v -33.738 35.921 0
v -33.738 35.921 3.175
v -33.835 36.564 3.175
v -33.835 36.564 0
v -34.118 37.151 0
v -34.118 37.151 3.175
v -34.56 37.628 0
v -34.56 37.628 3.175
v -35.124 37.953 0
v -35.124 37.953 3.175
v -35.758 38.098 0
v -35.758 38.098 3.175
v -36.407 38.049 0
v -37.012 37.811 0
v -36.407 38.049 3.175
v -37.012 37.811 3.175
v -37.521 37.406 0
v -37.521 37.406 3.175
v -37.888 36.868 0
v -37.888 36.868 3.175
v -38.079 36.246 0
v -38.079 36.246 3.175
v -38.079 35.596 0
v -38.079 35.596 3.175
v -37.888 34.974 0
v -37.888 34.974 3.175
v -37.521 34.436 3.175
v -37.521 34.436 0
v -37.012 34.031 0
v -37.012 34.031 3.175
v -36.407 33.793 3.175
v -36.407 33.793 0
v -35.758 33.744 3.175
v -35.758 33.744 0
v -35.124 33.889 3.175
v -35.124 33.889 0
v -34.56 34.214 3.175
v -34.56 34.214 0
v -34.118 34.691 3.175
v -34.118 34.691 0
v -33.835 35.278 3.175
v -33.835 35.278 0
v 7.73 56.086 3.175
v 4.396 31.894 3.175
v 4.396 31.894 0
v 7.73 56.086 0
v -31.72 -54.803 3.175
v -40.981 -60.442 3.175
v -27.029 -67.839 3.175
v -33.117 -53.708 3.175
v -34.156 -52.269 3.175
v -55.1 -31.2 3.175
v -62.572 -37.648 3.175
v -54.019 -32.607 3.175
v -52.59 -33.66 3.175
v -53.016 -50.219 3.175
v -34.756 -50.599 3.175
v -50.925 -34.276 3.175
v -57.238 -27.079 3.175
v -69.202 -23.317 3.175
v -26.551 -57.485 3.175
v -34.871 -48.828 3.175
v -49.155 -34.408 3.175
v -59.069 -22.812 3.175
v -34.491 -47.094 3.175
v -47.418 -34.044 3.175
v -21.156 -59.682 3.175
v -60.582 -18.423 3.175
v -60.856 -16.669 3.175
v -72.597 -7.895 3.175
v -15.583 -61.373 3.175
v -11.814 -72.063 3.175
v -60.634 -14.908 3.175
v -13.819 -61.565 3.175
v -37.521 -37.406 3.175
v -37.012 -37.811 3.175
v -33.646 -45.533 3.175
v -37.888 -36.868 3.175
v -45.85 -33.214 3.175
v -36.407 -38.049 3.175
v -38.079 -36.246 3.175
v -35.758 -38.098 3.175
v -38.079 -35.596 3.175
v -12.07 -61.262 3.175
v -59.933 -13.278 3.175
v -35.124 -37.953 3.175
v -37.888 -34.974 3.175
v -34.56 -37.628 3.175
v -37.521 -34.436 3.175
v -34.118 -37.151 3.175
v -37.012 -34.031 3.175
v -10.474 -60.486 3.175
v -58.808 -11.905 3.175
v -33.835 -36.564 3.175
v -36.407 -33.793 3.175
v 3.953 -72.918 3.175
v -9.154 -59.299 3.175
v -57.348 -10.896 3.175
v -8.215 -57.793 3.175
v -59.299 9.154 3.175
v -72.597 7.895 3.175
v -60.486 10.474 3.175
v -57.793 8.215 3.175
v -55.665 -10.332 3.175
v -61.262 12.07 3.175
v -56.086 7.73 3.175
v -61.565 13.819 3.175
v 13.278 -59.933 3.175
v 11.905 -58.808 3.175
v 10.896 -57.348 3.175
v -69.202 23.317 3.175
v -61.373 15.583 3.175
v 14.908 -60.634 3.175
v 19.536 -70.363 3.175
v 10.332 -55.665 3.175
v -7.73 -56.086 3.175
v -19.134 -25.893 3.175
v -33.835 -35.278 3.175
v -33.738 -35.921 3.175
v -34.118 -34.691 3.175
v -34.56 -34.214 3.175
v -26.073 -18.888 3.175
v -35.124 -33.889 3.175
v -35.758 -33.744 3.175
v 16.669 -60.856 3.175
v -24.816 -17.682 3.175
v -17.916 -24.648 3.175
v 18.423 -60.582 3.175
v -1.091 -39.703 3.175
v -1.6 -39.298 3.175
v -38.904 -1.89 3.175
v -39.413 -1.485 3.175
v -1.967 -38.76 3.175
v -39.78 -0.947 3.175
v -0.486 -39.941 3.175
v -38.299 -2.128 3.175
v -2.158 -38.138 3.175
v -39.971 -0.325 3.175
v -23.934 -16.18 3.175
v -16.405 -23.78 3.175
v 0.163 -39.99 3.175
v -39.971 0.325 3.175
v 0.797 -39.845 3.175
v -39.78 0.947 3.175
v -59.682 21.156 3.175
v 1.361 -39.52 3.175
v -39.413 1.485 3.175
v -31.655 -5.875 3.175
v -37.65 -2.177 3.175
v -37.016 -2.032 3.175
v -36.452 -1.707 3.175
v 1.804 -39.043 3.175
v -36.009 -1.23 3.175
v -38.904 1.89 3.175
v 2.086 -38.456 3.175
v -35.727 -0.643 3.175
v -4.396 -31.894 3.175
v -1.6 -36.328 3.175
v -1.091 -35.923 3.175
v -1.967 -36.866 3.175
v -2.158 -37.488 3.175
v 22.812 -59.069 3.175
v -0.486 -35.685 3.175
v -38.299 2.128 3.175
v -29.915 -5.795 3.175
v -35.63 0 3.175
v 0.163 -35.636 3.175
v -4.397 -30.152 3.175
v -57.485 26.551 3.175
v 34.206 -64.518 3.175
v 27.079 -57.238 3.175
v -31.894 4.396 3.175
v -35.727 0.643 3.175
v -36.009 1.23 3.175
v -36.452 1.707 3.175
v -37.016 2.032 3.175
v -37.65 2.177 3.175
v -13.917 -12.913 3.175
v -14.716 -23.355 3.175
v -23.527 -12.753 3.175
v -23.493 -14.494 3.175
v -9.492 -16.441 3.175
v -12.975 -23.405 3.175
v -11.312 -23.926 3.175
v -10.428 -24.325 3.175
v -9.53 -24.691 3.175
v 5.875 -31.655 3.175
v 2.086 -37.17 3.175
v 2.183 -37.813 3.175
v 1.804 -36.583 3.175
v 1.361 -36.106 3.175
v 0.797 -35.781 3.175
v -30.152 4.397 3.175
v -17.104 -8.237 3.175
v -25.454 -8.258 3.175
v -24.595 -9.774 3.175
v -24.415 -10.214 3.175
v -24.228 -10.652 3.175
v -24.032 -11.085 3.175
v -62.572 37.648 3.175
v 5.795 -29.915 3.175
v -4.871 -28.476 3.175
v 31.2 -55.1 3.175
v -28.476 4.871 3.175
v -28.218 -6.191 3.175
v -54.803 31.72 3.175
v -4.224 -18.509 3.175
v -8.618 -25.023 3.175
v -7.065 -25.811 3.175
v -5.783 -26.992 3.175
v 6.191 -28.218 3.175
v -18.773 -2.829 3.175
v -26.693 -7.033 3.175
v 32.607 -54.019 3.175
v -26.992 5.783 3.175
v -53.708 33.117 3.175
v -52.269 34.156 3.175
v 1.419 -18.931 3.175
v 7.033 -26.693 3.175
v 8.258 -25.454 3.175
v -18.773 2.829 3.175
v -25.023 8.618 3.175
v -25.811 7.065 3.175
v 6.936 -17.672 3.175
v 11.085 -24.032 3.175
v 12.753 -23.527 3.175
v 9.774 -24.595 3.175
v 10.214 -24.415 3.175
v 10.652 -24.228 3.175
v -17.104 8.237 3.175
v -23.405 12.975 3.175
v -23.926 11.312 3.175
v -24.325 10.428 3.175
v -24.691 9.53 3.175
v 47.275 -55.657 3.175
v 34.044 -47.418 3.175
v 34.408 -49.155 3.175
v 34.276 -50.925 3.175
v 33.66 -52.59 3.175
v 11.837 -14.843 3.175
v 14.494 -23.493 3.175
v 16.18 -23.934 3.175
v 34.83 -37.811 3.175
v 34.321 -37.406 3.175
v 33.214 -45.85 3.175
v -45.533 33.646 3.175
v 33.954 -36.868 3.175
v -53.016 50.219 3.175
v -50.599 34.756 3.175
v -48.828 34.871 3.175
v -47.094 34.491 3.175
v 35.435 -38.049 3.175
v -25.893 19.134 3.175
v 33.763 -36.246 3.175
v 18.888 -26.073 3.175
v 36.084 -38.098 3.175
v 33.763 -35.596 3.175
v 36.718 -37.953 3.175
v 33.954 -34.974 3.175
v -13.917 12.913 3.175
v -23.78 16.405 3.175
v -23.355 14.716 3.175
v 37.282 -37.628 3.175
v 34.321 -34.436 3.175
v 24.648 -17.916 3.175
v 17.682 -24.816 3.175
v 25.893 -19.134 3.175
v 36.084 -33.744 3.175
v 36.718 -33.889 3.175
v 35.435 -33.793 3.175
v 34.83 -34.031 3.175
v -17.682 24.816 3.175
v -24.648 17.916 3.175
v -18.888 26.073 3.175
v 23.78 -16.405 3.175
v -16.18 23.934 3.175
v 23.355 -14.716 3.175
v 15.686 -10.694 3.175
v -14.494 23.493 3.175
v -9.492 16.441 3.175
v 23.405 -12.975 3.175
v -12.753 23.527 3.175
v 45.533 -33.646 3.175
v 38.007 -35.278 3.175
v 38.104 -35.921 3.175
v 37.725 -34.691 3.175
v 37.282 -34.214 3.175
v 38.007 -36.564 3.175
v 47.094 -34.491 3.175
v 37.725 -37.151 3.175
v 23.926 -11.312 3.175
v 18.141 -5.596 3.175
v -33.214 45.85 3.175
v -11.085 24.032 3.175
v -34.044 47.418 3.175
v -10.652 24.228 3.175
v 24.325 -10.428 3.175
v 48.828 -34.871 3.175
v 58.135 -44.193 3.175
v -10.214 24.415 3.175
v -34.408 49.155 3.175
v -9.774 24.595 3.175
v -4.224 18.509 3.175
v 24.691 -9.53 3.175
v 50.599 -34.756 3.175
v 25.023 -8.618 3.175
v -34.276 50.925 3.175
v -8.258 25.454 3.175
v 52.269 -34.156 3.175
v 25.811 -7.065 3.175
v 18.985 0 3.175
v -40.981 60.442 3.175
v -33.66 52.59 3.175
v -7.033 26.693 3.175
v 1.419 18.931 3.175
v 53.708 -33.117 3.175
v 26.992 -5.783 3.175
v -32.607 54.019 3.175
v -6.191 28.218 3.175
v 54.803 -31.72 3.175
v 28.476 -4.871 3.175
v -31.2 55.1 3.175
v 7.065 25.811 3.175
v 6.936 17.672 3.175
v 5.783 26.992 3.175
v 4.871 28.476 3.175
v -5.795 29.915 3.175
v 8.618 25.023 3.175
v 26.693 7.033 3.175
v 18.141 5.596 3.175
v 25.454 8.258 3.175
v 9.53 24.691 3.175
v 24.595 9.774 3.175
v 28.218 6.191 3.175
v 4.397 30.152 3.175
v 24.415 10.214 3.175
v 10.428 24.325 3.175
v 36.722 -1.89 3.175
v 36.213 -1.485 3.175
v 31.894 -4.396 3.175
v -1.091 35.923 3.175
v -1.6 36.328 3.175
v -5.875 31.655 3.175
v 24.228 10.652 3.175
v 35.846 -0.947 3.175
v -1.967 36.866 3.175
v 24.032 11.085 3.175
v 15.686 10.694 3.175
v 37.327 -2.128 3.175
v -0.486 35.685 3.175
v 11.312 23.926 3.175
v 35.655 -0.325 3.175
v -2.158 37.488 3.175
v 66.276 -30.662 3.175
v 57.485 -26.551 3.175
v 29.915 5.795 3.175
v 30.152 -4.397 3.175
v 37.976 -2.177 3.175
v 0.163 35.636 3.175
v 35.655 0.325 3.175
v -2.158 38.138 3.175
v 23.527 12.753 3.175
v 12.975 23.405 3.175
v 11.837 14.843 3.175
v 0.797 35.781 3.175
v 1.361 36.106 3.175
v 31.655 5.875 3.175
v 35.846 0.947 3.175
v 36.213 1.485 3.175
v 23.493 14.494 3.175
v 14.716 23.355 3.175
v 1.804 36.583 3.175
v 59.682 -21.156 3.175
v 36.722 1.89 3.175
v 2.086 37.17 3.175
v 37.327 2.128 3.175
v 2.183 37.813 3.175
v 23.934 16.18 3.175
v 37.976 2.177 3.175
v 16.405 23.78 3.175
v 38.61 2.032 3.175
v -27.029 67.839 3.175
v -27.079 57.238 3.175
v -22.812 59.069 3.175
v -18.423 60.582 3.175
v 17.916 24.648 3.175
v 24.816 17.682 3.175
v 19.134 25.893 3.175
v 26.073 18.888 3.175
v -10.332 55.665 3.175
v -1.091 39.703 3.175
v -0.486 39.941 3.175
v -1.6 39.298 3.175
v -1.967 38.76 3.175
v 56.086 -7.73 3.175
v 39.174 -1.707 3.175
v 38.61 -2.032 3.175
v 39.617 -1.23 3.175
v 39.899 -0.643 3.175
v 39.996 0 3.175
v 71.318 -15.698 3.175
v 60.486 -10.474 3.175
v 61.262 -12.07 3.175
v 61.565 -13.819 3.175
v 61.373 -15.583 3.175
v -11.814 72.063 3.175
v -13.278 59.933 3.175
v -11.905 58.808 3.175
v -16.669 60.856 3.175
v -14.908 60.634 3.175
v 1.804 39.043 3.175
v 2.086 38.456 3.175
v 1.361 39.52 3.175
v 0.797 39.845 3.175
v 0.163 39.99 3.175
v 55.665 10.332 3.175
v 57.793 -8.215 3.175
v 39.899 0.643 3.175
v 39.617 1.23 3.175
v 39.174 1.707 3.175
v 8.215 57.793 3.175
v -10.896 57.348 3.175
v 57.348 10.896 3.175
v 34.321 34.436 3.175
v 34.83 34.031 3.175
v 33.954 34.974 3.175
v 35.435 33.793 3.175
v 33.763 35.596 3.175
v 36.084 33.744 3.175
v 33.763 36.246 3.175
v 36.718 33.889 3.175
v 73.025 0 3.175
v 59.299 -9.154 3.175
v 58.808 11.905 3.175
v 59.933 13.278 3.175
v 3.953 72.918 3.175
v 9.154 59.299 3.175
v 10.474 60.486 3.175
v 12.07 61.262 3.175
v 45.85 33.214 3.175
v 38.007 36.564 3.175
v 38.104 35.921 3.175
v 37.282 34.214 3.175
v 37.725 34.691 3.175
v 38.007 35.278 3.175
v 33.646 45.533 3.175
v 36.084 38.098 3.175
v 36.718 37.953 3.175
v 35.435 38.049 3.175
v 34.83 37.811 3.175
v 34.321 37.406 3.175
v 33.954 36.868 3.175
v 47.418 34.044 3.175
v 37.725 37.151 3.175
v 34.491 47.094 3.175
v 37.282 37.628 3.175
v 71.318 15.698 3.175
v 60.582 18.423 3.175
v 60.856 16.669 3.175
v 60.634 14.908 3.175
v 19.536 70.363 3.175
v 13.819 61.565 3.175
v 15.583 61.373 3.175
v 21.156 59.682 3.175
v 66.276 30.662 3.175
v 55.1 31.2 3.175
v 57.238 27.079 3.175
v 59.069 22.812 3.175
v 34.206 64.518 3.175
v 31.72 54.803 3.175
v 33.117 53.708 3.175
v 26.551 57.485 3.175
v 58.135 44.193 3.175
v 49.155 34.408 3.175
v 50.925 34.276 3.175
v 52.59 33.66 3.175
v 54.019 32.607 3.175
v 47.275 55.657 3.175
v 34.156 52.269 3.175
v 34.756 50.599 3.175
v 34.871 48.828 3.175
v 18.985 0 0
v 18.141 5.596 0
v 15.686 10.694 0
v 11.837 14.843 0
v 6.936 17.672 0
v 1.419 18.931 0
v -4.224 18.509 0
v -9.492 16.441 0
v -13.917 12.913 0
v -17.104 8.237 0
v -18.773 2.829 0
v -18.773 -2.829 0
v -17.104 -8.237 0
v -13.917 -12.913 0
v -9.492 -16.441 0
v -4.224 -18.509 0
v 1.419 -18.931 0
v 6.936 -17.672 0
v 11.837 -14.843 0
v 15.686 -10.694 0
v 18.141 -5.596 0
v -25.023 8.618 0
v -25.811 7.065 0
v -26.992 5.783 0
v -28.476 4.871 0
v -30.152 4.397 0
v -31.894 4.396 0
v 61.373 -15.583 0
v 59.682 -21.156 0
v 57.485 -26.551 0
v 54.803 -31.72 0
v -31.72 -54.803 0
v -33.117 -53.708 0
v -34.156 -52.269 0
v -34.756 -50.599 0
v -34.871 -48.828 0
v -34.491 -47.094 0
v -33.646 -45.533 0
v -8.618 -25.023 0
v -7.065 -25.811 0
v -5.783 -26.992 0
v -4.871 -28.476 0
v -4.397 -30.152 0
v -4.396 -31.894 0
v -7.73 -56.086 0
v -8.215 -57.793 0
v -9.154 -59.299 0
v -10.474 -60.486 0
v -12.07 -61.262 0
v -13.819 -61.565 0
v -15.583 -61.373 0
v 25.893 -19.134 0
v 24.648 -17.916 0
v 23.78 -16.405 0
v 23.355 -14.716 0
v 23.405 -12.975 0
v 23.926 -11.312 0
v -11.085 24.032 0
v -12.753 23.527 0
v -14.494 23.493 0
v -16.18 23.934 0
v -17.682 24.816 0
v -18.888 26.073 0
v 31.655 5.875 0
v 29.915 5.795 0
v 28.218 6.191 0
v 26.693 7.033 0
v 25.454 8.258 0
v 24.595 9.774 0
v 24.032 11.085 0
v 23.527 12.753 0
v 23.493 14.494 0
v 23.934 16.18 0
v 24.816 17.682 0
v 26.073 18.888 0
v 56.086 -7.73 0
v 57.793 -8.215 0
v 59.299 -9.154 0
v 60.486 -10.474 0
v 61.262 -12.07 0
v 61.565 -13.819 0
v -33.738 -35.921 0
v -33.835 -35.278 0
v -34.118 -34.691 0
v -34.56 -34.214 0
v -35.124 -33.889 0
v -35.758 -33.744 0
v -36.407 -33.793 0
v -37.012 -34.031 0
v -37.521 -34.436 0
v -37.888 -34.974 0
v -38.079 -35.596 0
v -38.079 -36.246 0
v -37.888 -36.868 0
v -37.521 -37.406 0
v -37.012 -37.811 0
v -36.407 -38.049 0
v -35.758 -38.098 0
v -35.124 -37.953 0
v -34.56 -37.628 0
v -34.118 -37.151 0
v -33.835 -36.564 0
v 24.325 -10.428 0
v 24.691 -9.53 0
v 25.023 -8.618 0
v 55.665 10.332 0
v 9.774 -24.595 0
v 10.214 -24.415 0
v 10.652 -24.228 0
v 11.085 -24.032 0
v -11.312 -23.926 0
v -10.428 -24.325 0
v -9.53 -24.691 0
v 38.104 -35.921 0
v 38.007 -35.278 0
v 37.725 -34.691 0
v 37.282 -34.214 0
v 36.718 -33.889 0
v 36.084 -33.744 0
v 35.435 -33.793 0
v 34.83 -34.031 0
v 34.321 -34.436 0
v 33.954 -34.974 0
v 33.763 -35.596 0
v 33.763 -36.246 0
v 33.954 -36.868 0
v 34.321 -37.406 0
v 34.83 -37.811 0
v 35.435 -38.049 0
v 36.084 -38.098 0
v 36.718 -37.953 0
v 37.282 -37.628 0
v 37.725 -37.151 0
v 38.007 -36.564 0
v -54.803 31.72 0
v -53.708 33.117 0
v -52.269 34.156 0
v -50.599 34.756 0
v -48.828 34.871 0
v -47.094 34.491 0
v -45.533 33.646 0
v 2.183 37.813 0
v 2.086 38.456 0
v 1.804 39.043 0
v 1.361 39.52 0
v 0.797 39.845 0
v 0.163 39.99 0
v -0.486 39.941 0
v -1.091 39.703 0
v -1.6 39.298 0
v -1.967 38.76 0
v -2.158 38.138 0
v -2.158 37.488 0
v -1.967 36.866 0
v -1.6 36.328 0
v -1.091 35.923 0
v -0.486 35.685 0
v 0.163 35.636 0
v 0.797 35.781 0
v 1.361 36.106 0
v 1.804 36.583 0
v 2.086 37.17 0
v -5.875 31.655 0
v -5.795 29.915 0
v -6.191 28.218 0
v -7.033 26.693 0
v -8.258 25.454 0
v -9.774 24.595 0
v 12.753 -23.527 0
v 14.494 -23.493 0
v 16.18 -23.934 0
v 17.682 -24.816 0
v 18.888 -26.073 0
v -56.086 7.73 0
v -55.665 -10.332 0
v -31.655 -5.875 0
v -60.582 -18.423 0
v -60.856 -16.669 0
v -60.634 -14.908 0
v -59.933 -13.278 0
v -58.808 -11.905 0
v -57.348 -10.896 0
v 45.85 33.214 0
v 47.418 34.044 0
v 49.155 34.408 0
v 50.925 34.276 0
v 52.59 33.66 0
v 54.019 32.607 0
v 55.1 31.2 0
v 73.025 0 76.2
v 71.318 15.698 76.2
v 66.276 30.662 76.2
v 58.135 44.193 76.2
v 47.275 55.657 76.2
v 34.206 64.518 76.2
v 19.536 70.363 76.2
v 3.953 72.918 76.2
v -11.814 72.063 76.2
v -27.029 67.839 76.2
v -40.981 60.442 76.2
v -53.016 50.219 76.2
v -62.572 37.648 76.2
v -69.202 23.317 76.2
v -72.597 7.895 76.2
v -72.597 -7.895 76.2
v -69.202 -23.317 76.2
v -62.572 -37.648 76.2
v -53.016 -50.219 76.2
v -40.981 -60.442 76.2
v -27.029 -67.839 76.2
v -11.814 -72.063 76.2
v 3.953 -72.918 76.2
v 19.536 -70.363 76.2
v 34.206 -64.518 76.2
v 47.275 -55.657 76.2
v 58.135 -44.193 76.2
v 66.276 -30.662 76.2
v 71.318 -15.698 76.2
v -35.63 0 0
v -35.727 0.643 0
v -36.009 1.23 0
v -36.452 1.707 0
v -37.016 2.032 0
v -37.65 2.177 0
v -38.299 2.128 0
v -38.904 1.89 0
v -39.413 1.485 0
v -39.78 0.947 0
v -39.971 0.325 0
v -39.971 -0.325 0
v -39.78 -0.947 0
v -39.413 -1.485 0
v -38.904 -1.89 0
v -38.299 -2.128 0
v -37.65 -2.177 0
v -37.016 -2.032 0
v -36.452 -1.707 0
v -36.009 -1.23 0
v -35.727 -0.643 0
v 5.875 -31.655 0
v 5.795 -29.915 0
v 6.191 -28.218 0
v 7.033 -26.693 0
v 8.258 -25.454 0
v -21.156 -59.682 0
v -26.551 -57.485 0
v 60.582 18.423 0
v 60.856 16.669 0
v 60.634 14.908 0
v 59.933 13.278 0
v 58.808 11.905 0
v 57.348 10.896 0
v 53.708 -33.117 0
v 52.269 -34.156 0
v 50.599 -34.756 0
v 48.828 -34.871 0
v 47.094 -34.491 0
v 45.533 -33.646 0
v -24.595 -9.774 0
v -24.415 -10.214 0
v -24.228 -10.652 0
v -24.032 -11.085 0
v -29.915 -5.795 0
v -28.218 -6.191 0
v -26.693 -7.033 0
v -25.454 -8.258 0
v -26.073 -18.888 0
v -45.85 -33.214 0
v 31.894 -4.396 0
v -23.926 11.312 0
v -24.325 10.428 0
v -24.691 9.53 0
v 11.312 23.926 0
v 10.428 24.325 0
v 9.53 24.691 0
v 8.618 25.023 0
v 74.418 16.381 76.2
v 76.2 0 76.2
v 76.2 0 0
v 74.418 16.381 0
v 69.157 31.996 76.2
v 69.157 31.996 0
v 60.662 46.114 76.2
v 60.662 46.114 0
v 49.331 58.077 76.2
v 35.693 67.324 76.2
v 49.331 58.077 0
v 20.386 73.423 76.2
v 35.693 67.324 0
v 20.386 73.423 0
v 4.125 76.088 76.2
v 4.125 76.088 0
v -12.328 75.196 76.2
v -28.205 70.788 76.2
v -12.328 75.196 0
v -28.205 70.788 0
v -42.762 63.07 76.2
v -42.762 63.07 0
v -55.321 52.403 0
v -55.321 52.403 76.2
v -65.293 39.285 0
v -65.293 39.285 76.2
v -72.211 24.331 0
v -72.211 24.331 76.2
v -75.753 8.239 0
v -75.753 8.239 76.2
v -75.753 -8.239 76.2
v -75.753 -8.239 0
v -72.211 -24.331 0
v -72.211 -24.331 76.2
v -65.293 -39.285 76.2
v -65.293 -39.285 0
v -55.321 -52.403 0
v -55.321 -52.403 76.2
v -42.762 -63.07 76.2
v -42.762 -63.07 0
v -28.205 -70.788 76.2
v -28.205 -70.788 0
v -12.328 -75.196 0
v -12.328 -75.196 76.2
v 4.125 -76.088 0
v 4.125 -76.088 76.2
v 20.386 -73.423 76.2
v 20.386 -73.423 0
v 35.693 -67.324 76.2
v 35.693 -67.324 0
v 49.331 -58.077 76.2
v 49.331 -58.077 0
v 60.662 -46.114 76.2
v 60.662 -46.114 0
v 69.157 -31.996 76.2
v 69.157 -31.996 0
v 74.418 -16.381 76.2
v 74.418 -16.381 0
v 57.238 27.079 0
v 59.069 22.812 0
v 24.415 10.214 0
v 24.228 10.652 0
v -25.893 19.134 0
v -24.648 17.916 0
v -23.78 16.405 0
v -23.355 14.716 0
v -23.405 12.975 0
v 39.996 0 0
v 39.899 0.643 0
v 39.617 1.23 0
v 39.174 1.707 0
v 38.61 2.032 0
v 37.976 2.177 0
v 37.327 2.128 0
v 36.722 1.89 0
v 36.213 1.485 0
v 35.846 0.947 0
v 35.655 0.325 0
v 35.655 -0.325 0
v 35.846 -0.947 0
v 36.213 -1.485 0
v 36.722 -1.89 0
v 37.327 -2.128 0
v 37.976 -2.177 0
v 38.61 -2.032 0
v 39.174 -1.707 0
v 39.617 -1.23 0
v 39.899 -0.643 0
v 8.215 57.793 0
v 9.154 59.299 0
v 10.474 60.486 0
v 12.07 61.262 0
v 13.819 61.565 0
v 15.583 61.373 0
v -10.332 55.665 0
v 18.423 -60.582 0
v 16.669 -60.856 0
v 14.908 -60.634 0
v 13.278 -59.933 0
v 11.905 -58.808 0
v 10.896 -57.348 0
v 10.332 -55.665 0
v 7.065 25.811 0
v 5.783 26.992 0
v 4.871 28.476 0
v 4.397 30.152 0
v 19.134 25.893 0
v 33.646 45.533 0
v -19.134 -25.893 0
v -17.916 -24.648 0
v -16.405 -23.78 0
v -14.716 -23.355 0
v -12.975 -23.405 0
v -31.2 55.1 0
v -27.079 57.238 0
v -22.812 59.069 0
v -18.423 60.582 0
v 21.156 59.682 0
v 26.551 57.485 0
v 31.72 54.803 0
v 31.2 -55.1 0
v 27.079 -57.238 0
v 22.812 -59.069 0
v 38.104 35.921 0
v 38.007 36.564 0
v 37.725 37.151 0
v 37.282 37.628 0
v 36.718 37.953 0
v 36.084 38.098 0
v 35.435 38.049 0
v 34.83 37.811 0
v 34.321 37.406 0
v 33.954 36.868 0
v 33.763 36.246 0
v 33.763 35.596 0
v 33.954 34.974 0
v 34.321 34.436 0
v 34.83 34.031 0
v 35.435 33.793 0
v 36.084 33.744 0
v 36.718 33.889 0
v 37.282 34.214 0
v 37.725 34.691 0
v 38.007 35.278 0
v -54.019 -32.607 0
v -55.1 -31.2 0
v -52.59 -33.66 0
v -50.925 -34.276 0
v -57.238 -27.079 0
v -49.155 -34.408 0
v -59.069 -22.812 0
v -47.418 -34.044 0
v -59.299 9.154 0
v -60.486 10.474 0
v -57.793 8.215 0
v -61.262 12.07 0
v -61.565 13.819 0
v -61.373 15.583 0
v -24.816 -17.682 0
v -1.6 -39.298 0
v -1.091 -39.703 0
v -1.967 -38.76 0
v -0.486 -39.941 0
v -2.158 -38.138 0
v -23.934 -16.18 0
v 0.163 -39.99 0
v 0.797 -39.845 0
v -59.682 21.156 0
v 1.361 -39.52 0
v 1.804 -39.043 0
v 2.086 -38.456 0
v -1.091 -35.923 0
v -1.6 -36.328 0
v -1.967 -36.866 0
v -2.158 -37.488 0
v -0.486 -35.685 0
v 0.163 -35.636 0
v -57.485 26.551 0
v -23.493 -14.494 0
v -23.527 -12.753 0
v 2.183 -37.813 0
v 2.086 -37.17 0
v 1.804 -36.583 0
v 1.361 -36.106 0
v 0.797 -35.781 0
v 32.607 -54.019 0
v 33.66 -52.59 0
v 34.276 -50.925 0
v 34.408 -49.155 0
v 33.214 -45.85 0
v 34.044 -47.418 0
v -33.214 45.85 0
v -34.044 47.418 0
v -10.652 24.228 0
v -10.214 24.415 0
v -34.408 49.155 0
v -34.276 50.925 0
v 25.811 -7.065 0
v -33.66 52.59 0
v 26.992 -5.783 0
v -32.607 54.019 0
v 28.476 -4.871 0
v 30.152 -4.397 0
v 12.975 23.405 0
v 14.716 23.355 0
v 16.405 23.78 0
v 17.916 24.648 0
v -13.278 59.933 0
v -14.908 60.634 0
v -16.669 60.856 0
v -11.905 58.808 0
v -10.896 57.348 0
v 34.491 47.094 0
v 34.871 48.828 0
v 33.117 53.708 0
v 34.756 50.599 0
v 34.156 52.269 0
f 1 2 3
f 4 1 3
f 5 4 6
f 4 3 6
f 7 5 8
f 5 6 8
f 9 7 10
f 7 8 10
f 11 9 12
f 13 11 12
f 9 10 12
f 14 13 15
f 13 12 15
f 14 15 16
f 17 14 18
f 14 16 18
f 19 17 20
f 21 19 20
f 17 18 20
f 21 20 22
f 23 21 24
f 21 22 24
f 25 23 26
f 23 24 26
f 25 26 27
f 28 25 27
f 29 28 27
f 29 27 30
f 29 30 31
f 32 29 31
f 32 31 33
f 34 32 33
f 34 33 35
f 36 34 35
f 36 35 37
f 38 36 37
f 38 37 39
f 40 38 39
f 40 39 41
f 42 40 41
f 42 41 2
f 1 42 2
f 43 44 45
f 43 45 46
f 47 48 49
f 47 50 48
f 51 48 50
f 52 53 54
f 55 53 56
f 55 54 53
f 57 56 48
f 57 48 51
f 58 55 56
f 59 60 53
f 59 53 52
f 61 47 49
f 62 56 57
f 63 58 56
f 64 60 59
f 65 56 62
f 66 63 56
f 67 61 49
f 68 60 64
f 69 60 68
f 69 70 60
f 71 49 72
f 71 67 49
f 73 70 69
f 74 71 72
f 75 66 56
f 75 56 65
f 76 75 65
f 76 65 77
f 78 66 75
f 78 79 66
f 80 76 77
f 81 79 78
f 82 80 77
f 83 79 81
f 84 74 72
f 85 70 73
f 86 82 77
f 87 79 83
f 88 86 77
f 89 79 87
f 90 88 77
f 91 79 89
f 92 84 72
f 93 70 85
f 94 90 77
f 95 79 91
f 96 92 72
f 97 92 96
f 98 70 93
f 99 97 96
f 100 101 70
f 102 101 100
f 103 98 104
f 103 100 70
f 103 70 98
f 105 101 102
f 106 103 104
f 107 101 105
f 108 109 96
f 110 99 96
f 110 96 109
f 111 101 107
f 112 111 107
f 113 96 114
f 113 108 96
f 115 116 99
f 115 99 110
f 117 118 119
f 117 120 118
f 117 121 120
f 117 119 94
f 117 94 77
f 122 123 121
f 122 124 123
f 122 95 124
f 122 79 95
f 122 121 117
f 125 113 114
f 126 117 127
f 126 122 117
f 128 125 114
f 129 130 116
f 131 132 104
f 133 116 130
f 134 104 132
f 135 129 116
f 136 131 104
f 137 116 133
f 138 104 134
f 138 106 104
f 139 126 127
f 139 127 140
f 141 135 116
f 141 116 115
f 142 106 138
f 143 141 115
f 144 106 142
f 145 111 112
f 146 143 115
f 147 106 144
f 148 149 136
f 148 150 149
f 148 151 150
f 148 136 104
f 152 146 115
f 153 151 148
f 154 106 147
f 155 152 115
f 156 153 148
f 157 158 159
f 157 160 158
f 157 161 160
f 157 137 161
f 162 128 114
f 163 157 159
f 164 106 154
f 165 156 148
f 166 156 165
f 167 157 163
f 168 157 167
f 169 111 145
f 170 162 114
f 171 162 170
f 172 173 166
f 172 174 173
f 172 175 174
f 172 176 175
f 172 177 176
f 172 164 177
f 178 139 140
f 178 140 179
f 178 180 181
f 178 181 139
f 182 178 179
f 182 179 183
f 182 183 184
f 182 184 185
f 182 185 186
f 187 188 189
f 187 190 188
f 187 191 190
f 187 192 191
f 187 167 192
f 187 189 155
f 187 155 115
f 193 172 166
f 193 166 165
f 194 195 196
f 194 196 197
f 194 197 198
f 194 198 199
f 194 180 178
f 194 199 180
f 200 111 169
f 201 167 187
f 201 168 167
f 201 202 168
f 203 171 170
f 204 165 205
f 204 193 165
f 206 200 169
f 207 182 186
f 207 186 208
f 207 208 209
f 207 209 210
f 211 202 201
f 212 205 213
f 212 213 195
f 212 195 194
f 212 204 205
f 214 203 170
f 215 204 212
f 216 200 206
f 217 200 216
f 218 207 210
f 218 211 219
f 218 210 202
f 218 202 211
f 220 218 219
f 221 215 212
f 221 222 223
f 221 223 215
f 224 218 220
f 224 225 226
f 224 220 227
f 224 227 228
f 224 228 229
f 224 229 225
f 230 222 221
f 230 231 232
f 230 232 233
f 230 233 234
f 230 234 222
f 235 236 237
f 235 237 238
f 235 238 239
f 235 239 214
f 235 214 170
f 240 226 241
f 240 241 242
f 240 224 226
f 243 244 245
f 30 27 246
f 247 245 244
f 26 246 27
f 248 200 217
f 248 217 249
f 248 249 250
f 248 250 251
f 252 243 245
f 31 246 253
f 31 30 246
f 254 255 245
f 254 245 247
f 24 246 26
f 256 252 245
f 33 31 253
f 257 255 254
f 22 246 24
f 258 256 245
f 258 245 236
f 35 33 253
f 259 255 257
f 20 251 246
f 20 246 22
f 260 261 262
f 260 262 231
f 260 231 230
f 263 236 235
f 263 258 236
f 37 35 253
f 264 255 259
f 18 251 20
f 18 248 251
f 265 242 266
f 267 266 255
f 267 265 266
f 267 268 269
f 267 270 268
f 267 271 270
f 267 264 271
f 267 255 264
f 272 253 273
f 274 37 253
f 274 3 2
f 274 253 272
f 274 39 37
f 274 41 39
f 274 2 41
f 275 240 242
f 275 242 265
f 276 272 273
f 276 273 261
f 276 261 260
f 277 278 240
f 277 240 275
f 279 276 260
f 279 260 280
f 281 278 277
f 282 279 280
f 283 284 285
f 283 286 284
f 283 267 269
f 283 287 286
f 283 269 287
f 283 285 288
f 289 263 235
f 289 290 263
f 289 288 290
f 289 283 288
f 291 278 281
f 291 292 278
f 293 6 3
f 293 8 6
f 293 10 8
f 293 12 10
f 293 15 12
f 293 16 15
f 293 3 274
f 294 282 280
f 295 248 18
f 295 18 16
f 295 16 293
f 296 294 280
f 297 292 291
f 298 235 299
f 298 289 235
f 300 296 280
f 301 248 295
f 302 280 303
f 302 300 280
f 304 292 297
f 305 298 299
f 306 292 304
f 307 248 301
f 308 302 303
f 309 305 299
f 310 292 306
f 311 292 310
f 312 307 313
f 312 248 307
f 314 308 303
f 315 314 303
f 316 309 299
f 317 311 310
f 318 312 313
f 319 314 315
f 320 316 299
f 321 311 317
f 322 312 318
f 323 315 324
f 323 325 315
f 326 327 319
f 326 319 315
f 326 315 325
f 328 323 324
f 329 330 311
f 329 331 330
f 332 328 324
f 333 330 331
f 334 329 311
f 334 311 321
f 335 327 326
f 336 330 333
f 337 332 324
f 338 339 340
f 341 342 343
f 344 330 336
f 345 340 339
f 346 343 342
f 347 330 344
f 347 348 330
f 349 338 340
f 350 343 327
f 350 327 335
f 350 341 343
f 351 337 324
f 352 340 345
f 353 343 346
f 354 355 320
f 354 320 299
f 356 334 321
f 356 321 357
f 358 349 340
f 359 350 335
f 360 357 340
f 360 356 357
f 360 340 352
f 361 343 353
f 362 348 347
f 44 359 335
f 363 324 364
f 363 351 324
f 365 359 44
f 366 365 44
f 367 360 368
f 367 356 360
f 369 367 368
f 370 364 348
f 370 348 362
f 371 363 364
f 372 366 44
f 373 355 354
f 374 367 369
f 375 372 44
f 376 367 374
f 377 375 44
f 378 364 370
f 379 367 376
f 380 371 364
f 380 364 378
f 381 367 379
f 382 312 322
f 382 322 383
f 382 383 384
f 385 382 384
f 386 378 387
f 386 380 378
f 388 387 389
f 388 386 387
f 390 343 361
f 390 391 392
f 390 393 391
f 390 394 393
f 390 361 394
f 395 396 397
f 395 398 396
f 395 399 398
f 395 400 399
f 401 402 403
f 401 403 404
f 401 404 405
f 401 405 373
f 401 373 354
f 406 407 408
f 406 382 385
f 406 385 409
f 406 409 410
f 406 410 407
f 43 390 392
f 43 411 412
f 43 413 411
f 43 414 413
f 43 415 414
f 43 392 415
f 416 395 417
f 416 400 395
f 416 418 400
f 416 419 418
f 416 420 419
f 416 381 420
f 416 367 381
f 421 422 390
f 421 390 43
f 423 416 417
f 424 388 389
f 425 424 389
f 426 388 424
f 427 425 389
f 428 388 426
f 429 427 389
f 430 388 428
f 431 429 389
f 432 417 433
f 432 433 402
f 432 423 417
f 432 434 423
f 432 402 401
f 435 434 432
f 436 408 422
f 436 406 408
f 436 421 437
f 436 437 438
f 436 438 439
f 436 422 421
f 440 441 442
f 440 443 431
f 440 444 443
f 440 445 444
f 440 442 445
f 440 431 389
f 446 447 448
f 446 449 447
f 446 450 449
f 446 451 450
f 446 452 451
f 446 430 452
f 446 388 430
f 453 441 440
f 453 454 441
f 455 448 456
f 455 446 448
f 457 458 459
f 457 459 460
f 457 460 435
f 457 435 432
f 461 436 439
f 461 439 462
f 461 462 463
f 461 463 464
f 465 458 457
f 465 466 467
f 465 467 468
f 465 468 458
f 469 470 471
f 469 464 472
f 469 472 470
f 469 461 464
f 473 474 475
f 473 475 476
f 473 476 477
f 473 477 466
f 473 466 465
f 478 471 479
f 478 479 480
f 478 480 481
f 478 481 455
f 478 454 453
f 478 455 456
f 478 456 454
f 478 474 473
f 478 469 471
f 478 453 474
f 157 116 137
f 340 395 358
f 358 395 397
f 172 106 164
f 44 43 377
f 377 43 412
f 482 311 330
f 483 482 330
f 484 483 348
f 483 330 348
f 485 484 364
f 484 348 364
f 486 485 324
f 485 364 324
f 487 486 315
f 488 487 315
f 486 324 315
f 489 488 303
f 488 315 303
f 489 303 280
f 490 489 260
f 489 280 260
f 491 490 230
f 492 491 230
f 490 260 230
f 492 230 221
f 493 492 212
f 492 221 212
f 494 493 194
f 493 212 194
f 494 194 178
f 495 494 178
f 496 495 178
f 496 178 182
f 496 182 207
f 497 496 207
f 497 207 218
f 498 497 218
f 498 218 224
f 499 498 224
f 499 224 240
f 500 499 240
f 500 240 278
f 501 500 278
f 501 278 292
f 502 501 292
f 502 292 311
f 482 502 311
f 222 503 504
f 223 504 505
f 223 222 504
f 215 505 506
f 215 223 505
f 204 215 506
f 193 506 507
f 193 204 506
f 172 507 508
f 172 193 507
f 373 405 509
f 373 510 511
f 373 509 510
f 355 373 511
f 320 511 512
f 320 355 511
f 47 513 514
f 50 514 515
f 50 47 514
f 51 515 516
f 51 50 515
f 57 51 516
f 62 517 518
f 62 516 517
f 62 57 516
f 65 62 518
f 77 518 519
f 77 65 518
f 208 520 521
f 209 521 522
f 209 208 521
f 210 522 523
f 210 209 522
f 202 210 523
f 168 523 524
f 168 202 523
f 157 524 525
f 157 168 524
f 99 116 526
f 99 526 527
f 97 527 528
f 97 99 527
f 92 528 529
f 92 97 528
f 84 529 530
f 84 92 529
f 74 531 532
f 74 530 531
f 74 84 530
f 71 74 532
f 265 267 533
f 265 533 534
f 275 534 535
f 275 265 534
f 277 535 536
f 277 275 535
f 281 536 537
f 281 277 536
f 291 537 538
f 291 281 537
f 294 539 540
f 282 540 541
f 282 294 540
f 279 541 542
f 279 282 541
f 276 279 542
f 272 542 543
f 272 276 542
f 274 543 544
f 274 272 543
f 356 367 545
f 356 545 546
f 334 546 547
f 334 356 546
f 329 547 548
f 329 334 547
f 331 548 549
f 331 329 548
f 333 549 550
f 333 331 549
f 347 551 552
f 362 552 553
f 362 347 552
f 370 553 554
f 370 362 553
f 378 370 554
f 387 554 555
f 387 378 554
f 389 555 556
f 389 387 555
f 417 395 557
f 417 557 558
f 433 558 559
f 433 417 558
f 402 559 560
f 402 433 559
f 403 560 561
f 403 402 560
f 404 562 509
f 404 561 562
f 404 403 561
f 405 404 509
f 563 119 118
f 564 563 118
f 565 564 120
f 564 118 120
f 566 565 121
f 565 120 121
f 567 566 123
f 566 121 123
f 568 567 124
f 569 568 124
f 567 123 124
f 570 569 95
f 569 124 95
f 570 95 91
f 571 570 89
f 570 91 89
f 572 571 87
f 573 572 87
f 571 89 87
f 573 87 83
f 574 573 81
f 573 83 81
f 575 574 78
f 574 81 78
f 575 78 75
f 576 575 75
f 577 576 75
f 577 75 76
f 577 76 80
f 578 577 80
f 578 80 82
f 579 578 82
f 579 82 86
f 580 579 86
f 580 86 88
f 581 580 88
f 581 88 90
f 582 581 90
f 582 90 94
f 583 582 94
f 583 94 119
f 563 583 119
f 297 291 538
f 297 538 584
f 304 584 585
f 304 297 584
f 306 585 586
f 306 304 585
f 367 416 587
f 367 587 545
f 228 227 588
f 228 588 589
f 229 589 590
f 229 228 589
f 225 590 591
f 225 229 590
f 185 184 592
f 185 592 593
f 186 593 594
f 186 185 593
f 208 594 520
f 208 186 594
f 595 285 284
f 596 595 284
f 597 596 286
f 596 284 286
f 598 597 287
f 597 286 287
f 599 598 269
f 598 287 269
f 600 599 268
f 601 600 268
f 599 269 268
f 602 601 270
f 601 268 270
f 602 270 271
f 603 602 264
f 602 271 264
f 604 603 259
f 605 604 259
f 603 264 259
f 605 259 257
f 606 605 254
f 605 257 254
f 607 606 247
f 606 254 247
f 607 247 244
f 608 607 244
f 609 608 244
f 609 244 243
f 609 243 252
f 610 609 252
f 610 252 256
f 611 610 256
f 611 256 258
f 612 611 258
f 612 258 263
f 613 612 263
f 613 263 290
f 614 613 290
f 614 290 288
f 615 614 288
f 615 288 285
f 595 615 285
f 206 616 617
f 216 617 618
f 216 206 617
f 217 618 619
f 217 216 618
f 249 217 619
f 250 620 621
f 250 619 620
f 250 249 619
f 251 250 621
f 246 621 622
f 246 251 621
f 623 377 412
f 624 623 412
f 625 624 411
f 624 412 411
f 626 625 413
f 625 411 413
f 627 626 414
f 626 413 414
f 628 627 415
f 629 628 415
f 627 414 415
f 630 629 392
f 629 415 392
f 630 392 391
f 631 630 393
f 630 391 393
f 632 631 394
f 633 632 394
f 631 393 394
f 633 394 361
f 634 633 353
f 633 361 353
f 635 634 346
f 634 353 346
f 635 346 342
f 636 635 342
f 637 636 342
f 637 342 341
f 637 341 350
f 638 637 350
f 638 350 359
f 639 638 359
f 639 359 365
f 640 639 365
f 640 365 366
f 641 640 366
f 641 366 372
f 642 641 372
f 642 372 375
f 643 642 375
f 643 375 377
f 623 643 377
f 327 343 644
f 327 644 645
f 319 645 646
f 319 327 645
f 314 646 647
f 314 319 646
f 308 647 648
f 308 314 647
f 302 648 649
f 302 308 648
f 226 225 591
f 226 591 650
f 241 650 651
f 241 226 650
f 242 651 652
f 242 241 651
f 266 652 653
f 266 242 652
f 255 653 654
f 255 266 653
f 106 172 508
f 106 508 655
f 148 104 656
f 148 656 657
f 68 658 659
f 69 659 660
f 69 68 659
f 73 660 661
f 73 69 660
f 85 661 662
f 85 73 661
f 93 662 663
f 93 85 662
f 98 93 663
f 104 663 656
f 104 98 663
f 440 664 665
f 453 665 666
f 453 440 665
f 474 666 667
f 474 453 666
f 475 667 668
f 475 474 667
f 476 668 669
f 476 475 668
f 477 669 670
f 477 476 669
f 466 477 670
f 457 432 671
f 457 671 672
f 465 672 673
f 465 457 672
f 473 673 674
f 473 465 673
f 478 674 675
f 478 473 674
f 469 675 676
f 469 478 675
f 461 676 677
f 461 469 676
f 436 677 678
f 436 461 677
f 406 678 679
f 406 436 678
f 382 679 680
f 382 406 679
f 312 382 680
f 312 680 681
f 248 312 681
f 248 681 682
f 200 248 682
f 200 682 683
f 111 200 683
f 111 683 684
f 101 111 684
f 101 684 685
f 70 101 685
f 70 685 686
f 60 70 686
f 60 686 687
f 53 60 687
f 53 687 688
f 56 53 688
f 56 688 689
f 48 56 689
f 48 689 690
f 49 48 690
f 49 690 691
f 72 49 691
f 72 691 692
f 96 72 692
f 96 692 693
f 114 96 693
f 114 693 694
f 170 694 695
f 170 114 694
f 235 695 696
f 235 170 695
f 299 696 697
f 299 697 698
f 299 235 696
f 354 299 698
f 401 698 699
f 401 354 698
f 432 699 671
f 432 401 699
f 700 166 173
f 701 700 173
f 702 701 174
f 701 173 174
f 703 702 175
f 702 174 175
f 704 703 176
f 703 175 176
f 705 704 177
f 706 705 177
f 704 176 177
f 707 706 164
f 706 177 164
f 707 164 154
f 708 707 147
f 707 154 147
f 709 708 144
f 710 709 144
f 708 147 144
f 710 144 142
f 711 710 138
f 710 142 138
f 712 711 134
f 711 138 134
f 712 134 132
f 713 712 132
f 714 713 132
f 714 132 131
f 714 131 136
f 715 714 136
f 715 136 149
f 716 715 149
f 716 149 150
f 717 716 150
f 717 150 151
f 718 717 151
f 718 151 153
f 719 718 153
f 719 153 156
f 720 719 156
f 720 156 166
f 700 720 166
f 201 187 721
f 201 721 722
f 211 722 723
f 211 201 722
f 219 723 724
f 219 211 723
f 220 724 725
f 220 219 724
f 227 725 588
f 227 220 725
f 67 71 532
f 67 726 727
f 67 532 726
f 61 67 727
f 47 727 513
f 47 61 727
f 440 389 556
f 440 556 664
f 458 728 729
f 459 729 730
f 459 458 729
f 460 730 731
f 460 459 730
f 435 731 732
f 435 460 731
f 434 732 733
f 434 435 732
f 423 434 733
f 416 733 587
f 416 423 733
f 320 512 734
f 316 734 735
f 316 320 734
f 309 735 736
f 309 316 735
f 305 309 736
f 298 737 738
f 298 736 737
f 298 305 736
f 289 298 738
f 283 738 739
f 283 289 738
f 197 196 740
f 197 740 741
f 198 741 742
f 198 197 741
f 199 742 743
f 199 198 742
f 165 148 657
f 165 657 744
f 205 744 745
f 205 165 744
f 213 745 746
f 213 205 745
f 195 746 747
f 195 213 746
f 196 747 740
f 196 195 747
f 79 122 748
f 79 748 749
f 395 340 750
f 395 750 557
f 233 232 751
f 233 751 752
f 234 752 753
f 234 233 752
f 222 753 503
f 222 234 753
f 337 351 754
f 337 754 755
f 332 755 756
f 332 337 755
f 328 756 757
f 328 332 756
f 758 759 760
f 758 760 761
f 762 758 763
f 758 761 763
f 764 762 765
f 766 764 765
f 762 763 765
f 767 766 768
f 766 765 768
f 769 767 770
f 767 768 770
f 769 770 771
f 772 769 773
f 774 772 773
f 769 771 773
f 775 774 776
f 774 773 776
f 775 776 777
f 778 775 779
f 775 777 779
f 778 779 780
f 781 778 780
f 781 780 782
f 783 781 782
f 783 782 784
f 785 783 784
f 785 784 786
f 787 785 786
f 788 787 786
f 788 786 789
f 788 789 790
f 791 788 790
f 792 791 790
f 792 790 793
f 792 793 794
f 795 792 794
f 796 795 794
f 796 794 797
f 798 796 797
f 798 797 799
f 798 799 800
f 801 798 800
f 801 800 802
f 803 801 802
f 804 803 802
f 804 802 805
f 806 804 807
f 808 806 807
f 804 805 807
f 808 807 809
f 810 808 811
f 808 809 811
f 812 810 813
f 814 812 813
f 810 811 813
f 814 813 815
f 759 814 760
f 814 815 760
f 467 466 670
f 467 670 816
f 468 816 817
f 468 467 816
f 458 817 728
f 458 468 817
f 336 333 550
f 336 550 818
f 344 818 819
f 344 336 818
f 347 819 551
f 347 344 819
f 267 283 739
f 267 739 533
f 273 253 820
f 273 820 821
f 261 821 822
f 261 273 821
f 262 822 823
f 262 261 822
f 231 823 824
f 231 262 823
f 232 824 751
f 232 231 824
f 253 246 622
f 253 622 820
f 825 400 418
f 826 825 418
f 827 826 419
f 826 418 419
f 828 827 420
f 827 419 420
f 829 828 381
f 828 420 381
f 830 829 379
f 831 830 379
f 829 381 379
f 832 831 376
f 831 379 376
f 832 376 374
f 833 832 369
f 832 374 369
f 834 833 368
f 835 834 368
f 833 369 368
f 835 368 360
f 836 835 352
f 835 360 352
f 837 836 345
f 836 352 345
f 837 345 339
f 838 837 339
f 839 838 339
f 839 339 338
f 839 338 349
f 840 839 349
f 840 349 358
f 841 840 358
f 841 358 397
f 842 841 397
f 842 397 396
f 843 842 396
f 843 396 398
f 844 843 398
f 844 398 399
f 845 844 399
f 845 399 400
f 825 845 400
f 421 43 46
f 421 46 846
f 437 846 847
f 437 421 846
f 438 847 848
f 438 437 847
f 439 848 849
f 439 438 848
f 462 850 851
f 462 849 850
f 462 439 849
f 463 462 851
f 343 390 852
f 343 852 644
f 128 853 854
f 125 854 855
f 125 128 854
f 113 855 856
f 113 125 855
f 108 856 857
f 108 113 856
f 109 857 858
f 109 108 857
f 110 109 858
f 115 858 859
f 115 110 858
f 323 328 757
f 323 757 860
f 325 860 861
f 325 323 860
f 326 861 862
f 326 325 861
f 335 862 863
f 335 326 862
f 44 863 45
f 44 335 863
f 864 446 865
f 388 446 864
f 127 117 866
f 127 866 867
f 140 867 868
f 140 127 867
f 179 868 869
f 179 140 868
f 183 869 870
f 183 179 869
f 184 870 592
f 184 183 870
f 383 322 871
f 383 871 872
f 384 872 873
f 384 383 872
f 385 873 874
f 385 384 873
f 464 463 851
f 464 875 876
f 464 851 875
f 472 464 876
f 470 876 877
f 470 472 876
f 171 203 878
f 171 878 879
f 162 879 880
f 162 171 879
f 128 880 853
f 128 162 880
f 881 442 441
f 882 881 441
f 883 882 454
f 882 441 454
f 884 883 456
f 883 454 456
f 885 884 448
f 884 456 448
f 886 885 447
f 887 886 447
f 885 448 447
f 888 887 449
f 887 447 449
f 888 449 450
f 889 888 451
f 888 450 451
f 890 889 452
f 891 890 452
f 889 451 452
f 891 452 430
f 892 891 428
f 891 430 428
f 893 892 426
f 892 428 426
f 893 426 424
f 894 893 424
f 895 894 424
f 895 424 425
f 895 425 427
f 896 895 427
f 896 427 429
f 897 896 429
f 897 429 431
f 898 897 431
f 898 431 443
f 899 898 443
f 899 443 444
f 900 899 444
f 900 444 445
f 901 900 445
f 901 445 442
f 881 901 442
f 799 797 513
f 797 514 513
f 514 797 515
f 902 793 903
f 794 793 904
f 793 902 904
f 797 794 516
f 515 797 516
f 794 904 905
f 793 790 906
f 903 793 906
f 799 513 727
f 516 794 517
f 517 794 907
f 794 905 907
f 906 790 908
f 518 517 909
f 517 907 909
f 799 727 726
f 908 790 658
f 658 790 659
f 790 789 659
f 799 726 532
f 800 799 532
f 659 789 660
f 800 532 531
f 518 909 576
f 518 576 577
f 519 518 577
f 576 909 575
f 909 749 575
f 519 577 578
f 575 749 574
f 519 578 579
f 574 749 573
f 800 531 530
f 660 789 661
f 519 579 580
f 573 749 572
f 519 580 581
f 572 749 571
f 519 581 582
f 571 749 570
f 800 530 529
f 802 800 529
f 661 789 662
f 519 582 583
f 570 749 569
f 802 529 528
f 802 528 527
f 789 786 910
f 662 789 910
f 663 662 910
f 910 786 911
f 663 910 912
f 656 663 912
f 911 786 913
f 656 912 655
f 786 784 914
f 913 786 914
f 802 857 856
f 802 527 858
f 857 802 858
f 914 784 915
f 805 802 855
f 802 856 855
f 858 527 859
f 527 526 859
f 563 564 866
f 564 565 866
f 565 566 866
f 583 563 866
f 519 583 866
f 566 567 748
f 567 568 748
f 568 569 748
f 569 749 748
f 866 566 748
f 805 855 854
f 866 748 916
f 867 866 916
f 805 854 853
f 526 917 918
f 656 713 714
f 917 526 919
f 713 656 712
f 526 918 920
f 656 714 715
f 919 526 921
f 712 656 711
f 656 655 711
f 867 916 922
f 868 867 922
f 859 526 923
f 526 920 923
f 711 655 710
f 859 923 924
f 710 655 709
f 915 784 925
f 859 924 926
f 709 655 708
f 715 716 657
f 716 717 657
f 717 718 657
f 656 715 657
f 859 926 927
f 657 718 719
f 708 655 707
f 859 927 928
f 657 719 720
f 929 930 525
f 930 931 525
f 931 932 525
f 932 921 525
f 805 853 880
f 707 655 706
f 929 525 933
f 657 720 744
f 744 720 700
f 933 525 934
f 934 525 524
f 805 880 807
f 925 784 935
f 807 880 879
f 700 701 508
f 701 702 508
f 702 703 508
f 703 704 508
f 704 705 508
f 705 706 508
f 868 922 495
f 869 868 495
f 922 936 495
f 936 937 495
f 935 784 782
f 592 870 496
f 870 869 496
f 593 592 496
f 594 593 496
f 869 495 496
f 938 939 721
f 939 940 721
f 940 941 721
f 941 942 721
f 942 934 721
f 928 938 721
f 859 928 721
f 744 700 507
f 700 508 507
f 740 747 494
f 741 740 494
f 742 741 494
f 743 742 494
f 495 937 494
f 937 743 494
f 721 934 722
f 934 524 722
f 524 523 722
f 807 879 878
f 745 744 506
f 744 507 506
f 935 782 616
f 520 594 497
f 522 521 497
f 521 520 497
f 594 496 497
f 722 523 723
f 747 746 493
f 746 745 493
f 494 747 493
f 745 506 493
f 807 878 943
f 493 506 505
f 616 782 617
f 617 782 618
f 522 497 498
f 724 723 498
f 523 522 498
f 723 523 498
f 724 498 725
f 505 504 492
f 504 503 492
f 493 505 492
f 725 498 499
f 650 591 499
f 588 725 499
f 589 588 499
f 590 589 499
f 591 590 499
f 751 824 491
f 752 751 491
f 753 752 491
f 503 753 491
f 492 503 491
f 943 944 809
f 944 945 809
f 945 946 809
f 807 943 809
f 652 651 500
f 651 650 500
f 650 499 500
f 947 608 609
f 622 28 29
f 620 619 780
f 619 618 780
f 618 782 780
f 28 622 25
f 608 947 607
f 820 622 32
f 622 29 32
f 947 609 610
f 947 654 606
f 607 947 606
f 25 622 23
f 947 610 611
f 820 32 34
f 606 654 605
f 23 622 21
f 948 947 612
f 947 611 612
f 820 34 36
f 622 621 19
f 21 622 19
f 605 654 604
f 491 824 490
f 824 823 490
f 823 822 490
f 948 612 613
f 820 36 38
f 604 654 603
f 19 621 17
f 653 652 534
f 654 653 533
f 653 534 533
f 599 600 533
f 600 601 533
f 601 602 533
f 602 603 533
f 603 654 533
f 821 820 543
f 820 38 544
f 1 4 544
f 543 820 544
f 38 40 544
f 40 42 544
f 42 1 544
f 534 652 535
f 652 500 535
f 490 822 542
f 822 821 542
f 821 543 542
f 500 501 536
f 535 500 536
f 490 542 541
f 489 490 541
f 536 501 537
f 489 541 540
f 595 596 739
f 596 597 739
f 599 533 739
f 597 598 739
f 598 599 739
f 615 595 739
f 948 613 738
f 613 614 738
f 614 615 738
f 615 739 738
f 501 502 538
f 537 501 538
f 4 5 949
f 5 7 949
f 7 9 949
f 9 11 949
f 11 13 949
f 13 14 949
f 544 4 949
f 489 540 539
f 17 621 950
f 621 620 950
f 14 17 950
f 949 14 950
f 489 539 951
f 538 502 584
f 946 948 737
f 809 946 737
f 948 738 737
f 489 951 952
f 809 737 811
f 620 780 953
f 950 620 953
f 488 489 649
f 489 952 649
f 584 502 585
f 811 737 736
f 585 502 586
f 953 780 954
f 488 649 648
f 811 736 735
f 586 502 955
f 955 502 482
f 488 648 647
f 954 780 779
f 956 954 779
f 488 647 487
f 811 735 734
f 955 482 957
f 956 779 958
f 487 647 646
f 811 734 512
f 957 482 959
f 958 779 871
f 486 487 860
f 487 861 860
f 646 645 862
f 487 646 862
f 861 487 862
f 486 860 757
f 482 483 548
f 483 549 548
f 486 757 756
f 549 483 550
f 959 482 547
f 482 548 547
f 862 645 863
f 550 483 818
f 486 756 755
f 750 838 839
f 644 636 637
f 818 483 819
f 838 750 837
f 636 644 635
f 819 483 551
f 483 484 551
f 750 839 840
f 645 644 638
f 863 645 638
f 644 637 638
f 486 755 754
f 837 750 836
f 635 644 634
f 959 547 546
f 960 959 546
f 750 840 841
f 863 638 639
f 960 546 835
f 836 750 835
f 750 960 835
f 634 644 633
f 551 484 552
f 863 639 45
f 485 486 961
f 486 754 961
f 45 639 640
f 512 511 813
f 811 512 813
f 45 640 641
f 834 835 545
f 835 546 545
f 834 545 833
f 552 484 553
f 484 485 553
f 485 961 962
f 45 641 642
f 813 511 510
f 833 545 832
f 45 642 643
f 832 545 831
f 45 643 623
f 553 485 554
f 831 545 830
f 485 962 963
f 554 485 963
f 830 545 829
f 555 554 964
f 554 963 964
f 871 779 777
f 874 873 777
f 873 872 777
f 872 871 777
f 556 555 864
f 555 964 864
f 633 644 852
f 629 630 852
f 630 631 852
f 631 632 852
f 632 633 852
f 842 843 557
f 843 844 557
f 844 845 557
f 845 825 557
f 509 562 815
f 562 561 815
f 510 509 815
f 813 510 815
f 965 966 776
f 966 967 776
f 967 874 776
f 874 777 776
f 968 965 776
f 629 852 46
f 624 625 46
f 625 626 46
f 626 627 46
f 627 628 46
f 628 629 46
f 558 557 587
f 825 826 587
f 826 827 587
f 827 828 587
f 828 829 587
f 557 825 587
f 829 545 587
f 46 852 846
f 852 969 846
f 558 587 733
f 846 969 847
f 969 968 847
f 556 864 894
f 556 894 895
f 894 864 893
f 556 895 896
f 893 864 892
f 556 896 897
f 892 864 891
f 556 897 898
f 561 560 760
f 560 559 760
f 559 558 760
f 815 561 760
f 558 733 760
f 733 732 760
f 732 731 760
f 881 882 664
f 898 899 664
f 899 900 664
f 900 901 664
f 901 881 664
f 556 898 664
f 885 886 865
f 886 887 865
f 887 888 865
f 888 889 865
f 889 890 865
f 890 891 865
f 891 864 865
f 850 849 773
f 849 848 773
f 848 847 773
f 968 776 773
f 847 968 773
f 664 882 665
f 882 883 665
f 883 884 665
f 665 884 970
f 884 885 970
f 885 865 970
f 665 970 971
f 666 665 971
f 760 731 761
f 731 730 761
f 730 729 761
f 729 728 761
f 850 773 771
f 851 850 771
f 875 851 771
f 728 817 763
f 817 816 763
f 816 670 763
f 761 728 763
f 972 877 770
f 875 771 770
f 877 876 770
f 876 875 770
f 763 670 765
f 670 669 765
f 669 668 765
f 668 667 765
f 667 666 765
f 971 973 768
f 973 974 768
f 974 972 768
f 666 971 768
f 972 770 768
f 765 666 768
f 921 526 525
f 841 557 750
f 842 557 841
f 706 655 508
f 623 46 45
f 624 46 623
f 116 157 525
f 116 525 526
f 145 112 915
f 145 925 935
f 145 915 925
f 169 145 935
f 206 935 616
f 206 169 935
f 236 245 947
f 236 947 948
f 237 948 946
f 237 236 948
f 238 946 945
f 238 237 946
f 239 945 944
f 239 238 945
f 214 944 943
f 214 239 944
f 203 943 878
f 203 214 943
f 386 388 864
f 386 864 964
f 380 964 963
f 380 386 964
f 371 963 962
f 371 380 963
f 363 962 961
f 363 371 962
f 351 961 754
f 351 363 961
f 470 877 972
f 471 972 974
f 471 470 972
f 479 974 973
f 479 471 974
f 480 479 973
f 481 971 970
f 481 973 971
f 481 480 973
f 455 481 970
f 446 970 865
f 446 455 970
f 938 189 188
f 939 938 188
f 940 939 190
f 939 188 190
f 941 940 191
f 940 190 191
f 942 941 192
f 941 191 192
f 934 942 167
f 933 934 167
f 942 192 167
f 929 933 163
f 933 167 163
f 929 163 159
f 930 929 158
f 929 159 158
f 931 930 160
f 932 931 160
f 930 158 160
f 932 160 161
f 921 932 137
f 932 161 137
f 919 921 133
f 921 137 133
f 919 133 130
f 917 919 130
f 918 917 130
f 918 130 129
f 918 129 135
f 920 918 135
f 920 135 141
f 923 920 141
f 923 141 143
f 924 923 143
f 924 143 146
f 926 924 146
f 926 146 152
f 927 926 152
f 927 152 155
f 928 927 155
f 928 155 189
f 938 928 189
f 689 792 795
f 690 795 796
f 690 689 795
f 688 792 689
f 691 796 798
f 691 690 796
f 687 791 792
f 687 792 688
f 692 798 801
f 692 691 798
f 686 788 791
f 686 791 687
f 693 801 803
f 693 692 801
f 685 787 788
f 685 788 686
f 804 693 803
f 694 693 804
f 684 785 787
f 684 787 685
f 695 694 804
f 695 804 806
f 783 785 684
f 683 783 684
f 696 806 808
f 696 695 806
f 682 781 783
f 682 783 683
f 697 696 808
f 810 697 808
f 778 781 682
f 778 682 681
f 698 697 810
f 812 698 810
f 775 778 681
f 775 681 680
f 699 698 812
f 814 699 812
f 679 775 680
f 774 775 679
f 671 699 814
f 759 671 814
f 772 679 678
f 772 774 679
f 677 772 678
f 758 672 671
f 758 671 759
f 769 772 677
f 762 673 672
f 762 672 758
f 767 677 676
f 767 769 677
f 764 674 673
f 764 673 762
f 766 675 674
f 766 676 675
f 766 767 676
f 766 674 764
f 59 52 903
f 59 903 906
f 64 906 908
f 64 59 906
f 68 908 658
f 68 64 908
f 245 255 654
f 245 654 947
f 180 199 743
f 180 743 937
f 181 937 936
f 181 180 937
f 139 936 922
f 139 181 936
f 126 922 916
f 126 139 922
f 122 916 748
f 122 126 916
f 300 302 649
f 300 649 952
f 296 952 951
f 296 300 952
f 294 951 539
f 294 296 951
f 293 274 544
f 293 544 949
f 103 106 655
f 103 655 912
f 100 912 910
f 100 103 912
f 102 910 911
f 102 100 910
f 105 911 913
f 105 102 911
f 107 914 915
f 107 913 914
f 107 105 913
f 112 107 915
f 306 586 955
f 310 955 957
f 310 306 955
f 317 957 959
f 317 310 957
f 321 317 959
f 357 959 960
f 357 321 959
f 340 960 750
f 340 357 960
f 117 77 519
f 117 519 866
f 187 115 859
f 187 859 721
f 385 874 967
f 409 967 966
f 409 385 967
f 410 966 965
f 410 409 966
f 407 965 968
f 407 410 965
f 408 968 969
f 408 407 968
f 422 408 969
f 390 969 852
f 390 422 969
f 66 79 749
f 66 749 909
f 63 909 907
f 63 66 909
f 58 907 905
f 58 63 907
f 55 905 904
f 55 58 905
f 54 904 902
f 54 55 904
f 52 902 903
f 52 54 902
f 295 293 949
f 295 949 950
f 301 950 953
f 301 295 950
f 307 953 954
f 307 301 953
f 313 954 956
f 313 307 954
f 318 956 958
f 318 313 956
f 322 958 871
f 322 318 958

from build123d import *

# Parameters (mm, degrees)
SKETCH1_R           = 76.2
SKETCH1_R_2         = 73.025
BOSS_EXTRUDE1_DEPTH = 76.2
SKETCH3_R           = 76.2
BOSS_EXTRUDE2_DEPTH = 3.175
SKETCH5_R           = 2.1828125
CUT_EXTRUDE2_DEPTH  = 4.175
SKETCH11_R          = 2.1828125
CUT_EXTRUDE11_DEPTH = 4.175
SKETCH12_R          = 18.984546406
CUT_EXTRUDE12_DEPTH = 4.175
CUT_EXTRUDE13_DEPTH = 4.175
CIRPATTERN1_COUNT   = 4


with BuildPart() as part:
    # Sketch1 → Boss-Extrude1 (new body)
    with BuildSketch(Plane.XY):
        Circle(SKETCH1_R)
        Circle(SKETCH1_R_2, mode=Mode.SUBTRACT)
    extrude(amount=BOSS_EXTRUDE1_DEPTH)

    # Sketch3 → Boss-Extrude2 (add)
    with BuildSketch(Plane.XY):
        Circle(SKETCH3_R)
    extrude(amount=BOSS_EXTRUDE2_DEPTH)

    # Sketch5 → Cut-Extrude2 (cut, through all)
    with BuildSketch(Plane.XY.offset(3.175)):
        with Locations((0, 37.81298)):
            Circle(SKETCH5_R)
        with Locations((37.81298, 0)):
            Circle(SKETCH5_R)
        with Locations((-37.81298, 0)):
            Circle(SKETCH5_R)
        with Locations((0, -37.81298)):
            Circle(SKETCH5_R)
    extrude(amount=-CUT_EXTRUDE2_DEPTH, mode=Mode.SUBTRACT)

    # Sketch11 → Cut-Extrude11 (cut, through all)
    with BuildSketch(Plane.XY.offset(3.175)):
        with Locations((-35.921024484, 35.921024484)):
            Circle(SKETCH11_R)
        with Locations((-35.921024484, -35.921024484)):
            Circle(SKETCH11_R)
        with Locations((35.921024484, -35.921024484)):
            Circle(SKETCH11_R)
        with Locations((35.921024484, 35.921024484)):
            Circle(SKETCH11_R)
    extrude(amount=-CUT_EXTRUDE11_DEPTH, mode=Mode.SUBTRACT)

    # Sketch12 → Cut-Extrude12 (cut, through all)
    with BuildSketch(Plane.XY.offset(3.175)):
        Circle(SKETCH12_R)
    extrude(amount=-CUT_EXTRUDE12_DEPTH, mode=Mode.SUBTRACT)

    # Sketch13 → Cut-Extrude13 (cut, through all)
    with BuildSketch(Plane.XY.offset(3.175)):
        with BuildLine():
            Line((-18.887713582, 26.073256792), (-33.213845797, 45.849548003))
            ThreePointArc((-33.213845797, 45.849548003), (-34.276091741, 50.925360779), (-31.200233714, 55.10044631))
            ThreePointArc((-31.200233714, 55.10044631), (-24.962317442, 58.192752772), (-18.42261337, 60.581524279))
            ThreePointArc((-18.42261337, 60.581524279), (-13.277568117, 59.932870951), (-10.331766338, 55.665026803))
            Line((-10.331766338, 55.665026803), (-5.875364286, 31.655023908))
            ThreePointArc((-5.875364286, 31.655023908), (-6.559884807, 27.42673862), (-9.773713061, 24.595083138))
            ThreePointArc((-9.773713061, 24.595083138), (-10.43339446, 24.322579255), (-11.085487572, 24.032385376))
            ThreePointArc((-11.085487572, 24.032385376), (-15.352183804, 23.65520096), (-18.887713582, 26.073256792))
        make_face()
        with BuildLine():
            Line((-45.533204085, 33.646217178), (-25.893361536, 19.133590161))
            ThreePointArc((-25.893361536, 19.133590161), (-23.508869462, 15.575337449), (-23.926411262, 11.312401411))
            ThreePointArc((-23.926411262, 11.312401411), (-24.511909026, 9.980475814), (-25.023328549, 8.618387895))
            ThreePointArc((-25.023328549, 8.618387895), (-27.702333545, 5.276248304), (-31.894176796, 4.395671802))
            Line((-31.894176796, 4.395671802), (-56.085574643, 7.729742659))
            ThreePointArc((-56.085574643, 7.729742659), (-60.4859006, 10.473713006), (-61.373317696, 15.582992084))
            ThreePointArc((-61.373317696, 15.582992084), (-58.645731892, 23.878691299), (-54.802742327, 31.720233302))
            ThreePointArc((-54.802742327, 31.720233302), (-50.598737942, 34.756446226), (-45.533204085, 33.646217178))
        make_face()
    cut_extrude13 = extrude(amount=-CUT_EXTRUDE13_DEPTH, mode=Mode.SUBTRACT)

    # CirPattern1: Cut-Extrude13 ×4 about axis
    cirpattern1_axis = Axis((0, 0, 0), (0, 0, 1))
    for i in range(1, CIRPATTERN1_COUNT):
        add(cut_extrude13.rotate(cirpattern1_axis, i * 360 / CIRPATTERN1_COUNT), mode=Mode.SUBTRACT)


solid = part.part
